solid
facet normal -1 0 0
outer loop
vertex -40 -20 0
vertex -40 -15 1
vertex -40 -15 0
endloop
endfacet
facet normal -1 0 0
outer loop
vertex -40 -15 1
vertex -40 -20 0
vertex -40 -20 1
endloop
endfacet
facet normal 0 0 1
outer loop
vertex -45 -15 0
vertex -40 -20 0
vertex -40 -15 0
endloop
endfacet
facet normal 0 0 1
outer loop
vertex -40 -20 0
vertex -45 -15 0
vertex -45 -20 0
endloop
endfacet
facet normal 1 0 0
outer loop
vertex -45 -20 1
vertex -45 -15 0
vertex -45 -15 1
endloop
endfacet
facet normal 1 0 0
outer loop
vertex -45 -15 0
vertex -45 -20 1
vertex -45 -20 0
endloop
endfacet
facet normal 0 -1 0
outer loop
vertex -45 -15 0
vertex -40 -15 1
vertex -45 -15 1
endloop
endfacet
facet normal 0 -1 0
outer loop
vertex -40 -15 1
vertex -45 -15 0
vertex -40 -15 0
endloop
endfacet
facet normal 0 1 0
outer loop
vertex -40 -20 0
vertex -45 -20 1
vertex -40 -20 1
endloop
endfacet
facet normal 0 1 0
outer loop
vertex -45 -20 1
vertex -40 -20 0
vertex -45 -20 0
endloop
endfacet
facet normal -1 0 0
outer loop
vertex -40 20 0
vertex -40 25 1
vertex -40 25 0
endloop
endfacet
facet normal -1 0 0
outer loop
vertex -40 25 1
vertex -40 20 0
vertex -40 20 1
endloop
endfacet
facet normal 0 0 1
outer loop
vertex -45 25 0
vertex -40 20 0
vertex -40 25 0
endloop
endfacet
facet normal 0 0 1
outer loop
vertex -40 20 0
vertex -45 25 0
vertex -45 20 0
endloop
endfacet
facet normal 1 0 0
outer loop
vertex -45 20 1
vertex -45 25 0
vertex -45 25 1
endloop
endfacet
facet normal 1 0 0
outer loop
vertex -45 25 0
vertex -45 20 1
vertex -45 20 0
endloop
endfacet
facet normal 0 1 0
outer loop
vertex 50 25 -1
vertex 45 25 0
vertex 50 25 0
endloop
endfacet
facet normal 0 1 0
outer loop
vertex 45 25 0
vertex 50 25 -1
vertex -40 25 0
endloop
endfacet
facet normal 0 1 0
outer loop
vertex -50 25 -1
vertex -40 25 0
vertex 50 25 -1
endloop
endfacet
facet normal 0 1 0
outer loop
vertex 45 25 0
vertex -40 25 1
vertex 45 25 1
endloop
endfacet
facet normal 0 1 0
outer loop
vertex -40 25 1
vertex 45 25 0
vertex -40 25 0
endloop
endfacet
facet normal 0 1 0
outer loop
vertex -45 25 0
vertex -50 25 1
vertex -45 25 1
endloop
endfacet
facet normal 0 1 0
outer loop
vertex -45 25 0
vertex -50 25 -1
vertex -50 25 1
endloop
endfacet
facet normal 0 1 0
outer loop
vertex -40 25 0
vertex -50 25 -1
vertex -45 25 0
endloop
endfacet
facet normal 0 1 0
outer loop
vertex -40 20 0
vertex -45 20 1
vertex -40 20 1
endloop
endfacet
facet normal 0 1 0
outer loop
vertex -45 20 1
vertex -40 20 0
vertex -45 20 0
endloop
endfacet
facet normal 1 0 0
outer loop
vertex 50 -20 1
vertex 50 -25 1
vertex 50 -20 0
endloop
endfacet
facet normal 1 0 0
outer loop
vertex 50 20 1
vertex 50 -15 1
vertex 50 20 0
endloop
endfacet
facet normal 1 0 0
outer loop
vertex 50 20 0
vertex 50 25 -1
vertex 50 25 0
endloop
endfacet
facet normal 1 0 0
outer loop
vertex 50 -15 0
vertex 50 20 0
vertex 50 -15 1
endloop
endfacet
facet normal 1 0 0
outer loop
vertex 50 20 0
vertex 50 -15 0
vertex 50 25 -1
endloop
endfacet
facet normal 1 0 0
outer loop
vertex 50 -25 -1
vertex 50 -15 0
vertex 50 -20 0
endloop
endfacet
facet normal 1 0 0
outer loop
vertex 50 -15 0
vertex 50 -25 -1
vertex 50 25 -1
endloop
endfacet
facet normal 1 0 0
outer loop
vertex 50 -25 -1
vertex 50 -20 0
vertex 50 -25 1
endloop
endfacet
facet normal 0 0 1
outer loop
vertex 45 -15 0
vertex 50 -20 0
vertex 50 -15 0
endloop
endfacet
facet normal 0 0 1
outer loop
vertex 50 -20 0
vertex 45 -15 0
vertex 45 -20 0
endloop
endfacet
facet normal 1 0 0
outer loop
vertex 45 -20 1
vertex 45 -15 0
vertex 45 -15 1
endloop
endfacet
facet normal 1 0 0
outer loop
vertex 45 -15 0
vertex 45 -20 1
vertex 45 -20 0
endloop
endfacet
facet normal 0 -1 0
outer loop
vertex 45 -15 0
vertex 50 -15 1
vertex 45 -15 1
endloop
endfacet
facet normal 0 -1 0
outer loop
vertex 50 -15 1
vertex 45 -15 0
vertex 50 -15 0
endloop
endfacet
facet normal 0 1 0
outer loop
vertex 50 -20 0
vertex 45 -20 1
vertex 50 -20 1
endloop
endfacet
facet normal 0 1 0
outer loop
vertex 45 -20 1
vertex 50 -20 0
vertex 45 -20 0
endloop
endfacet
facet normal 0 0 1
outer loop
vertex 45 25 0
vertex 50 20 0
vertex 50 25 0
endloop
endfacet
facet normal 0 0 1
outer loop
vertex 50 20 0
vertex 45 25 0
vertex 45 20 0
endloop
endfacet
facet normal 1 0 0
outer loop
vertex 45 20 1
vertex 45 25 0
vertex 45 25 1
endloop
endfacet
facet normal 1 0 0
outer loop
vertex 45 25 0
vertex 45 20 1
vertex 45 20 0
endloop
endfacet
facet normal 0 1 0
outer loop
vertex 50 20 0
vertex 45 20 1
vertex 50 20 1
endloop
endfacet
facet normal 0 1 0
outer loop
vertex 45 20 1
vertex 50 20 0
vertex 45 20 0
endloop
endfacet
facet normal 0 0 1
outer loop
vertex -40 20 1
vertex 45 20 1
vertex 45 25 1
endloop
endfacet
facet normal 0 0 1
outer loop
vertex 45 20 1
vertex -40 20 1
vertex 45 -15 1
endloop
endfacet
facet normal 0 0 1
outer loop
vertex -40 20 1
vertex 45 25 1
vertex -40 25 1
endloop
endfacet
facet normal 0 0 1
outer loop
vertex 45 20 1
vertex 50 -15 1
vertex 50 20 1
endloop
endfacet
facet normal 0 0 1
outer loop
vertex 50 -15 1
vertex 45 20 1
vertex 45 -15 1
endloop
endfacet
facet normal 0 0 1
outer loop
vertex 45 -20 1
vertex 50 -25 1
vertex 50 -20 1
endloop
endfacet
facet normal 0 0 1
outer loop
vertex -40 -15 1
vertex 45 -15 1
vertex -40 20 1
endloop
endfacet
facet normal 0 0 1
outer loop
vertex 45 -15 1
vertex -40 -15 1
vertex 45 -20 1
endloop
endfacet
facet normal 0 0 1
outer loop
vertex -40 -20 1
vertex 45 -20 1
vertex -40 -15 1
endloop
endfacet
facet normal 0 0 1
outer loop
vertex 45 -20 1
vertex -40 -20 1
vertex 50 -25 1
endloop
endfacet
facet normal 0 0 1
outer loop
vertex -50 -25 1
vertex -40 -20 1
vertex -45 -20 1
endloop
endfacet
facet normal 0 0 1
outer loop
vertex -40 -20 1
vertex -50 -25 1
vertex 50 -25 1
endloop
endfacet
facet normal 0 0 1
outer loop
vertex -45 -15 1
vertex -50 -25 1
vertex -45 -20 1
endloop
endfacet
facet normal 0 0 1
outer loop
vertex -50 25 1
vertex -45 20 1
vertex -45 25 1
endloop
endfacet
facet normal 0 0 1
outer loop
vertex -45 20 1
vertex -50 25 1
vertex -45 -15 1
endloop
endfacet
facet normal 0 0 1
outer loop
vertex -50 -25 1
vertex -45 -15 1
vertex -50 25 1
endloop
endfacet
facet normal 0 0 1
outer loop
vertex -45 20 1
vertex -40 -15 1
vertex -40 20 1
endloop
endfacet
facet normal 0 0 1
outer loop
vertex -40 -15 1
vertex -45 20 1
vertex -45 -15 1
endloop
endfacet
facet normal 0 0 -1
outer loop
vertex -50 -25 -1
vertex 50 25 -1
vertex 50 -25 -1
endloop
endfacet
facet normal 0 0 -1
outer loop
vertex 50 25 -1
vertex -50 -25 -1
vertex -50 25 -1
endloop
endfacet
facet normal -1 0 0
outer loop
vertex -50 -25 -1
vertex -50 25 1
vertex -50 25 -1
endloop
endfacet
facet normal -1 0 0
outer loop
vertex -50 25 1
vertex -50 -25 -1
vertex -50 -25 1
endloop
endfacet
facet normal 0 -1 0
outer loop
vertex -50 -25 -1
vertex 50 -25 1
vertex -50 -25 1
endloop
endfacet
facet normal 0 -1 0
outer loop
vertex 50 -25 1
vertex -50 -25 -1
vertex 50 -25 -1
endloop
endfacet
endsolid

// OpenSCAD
module chamfered_plate() {
    plate_length = 100;
    plate_width = 50;
    plate_thickness = 2;
    chamfer_size = 5;

    difference() {
        cube([plate_length, plate_width, plate_thickness], center = true);
        for (x_offset = [-1, 1])
            for (y_offset = [-1, 1])
                translate([x_offset * (plate_length / 2 - chamfer_size), y_offset * (plate_width / 2 - chamfer_size), 0])
                    cube([chamfer_size, chamfer_size, plate_thickness], center = false);
    }
}

chamfered_plate();
